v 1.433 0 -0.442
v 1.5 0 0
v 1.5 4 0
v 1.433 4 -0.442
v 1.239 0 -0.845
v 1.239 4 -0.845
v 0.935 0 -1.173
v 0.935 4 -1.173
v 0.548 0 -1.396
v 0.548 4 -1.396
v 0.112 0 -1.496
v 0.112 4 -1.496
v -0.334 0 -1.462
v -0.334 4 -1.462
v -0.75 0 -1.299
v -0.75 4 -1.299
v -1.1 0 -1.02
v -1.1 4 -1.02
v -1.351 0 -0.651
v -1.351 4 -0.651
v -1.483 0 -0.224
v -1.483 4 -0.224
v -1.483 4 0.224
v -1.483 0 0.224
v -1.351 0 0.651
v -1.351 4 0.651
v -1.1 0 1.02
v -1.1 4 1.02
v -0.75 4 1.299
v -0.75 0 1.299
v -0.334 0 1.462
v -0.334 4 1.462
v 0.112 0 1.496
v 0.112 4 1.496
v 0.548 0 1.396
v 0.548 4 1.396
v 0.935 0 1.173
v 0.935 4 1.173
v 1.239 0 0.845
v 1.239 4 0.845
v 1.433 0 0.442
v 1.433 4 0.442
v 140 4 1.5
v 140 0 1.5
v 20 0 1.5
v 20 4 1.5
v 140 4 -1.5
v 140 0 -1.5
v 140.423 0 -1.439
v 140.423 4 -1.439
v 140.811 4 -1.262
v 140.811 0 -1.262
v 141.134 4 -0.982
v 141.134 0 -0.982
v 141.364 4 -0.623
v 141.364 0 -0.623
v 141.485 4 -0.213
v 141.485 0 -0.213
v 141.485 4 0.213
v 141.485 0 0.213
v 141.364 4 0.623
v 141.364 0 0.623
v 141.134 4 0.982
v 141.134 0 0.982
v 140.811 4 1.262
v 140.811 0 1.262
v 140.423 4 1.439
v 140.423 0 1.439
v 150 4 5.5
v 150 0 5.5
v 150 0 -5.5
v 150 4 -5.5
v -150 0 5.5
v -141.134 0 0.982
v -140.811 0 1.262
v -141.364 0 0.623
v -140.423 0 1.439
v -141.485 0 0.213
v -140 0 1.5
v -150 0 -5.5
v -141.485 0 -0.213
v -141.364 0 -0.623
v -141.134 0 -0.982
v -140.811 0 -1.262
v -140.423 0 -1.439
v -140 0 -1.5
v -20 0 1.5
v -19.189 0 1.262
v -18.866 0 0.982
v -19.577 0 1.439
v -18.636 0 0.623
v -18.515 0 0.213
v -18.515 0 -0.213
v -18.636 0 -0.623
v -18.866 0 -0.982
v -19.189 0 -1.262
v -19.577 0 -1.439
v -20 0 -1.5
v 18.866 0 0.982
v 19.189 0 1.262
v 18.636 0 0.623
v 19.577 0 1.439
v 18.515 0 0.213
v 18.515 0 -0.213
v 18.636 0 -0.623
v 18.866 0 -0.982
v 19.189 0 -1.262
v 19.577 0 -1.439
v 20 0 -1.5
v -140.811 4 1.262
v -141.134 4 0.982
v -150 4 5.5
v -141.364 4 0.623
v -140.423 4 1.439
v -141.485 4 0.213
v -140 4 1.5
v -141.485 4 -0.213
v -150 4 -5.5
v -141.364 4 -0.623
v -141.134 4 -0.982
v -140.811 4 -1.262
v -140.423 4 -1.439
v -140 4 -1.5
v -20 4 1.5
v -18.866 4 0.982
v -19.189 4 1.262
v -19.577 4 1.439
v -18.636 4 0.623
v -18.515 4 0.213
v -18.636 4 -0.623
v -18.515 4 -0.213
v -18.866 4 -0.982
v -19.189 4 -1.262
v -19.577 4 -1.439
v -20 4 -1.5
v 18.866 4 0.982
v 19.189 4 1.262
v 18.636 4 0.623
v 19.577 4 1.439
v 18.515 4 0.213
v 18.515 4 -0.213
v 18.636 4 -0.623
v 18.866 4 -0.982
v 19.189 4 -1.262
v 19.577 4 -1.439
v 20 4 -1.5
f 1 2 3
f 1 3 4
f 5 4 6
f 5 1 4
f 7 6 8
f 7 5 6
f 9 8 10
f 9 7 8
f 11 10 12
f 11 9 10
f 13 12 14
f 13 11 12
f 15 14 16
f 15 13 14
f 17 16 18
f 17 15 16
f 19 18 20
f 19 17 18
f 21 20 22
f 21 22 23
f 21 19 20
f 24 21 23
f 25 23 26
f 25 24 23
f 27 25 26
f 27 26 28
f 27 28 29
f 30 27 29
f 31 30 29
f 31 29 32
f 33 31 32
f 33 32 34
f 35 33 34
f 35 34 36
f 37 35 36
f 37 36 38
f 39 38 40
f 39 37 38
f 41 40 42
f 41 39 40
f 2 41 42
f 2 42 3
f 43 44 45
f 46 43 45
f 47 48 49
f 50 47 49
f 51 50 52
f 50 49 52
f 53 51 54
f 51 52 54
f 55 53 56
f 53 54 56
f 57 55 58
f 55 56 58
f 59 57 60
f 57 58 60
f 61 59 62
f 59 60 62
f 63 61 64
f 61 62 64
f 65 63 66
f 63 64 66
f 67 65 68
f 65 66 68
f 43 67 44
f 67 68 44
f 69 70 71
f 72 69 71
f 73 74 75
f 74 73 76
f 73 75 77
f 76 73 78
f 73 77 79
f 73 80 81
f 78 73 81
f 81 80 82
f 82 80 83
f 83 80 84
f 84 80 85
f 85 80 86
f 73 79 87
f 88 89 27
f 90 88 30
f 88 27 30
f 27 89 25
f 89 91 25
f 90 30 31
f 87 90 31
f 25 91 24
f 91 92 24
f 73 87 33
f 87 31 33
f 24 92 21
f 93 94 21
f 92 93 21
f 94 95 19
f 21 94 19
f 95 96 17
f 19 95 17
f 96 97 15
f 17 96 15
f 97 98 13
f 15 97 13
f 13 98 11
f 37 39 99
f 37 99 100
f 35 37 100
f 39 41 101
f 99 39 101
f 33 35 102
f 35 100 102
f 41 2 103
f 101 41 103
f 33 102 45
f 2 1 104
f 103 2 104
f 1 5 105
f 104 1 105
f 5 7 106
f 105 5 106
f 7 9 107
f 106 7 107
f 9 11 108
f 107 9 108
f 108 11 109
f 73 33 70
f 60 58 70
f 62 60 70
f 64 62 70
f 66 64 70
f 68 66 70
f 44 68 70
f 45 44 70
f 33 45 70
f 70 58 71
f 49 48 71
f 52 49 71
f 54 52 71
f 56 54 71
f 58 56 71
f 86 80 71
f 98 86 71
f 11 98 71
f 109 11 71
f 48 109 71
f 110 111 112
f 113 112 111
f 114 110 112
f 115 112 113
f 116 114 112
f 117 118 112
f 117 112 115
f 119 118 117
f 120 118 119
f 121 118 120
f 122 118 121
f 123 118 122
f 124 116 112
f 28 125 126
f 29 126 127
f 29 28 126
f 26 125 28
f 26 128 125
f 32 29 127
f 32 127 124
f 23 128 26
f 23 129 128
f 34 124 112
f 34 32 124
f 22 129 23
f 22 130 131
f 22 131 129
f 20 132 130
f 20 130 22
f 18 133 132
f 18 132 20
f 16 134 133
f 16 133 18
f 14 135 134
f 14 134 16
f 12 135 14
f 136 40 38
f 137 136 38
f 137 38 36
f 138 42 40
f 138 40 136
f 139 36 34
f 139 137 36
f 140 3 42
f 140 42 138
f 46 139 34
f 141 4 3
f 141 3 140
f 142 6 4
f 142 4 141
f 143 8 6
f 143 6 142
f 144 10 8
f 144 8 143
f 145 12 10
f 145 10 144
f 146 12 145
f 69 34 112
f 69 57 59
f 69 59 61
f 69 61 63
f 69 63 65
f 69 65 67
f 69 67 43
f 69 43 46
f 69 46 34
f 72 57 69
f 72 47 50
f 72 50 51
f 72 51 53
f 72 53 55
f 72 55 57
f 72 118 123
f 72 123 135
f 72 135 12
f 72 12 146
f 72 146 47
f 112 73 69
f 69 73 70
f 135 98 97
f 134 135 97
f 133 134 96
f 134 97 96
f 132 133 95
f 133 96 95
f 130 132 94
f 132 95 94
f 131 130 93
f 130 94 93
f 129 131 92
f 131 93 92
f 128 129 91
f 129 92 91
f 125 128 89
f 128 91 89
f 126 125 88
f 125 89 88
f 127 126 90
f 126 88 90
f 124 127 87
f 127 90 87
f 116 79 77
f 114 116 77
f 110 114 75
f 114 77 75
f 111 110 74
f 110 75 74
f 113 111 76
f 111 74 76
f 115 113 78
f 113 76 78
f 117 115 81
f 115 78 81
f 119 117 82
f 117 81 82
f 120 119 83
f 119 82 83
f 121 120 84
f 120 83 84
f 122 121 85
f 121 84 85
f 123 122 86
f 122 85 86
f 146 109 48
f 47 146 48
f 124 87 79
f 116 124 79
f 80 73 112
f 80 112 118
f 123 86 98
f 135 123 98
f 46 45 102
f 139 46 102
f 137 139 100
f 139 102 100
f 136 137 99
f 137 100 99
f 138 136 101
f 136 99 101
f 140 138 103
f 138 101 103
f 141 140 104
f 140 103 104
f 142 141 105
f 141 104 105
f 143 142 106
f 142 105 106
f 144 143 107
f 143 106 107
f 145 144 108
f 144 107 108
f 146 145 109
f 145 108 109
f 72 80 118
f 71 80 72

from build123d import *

# Parameters (mm, degrees)
SKETCH1_W           = 300
SKETCH1_H           = 11
SKETCH1_R           = 1.5
BOSS_EXTRUDE2_DEPTH = 4


with BuildPart() as part:
    # Sketch1 → Boss-Extrude2 (new body)
    with BuildSketch(Plane(origin=(0, 0, 0), x_dir=(1, 0, 0), z_dir=(0, 1, 0))):
        Rectangle(SKETCH1_W, SKETCH1_H)
        Circle(SKETCH1_R, mode=Mode.SUBTRACT)
        with BuildLine():
            Line((20, 1.5), (140, 1.5))
            ThreePointArc((140, 1.5), (141.5, 0), (140, -1.5))
            Line((140, -1.5), (20, -1.5))
            ThreePointArc((20, -1.5), (18.5, 0), (20, 1.5))
        make_face(mode=Mode.SUBTRACT)
        with BuildLine():
            Line((-20, -1.5), (-140, -1.5))
            ThreePointArc((-140, -1.5), (-141.5, 0), (-140, 1.5))
            Line((-140, 1.5), (-20, 1.5))
            ThreePointArc((-20, 1.5), (-18.5, 0), (-20, -1.5))
        make_face(mode=Mode.SUBTRACT)
    extrude(amount=BOSS_EXTRUDE2_DEPTH)


solid = part.part
